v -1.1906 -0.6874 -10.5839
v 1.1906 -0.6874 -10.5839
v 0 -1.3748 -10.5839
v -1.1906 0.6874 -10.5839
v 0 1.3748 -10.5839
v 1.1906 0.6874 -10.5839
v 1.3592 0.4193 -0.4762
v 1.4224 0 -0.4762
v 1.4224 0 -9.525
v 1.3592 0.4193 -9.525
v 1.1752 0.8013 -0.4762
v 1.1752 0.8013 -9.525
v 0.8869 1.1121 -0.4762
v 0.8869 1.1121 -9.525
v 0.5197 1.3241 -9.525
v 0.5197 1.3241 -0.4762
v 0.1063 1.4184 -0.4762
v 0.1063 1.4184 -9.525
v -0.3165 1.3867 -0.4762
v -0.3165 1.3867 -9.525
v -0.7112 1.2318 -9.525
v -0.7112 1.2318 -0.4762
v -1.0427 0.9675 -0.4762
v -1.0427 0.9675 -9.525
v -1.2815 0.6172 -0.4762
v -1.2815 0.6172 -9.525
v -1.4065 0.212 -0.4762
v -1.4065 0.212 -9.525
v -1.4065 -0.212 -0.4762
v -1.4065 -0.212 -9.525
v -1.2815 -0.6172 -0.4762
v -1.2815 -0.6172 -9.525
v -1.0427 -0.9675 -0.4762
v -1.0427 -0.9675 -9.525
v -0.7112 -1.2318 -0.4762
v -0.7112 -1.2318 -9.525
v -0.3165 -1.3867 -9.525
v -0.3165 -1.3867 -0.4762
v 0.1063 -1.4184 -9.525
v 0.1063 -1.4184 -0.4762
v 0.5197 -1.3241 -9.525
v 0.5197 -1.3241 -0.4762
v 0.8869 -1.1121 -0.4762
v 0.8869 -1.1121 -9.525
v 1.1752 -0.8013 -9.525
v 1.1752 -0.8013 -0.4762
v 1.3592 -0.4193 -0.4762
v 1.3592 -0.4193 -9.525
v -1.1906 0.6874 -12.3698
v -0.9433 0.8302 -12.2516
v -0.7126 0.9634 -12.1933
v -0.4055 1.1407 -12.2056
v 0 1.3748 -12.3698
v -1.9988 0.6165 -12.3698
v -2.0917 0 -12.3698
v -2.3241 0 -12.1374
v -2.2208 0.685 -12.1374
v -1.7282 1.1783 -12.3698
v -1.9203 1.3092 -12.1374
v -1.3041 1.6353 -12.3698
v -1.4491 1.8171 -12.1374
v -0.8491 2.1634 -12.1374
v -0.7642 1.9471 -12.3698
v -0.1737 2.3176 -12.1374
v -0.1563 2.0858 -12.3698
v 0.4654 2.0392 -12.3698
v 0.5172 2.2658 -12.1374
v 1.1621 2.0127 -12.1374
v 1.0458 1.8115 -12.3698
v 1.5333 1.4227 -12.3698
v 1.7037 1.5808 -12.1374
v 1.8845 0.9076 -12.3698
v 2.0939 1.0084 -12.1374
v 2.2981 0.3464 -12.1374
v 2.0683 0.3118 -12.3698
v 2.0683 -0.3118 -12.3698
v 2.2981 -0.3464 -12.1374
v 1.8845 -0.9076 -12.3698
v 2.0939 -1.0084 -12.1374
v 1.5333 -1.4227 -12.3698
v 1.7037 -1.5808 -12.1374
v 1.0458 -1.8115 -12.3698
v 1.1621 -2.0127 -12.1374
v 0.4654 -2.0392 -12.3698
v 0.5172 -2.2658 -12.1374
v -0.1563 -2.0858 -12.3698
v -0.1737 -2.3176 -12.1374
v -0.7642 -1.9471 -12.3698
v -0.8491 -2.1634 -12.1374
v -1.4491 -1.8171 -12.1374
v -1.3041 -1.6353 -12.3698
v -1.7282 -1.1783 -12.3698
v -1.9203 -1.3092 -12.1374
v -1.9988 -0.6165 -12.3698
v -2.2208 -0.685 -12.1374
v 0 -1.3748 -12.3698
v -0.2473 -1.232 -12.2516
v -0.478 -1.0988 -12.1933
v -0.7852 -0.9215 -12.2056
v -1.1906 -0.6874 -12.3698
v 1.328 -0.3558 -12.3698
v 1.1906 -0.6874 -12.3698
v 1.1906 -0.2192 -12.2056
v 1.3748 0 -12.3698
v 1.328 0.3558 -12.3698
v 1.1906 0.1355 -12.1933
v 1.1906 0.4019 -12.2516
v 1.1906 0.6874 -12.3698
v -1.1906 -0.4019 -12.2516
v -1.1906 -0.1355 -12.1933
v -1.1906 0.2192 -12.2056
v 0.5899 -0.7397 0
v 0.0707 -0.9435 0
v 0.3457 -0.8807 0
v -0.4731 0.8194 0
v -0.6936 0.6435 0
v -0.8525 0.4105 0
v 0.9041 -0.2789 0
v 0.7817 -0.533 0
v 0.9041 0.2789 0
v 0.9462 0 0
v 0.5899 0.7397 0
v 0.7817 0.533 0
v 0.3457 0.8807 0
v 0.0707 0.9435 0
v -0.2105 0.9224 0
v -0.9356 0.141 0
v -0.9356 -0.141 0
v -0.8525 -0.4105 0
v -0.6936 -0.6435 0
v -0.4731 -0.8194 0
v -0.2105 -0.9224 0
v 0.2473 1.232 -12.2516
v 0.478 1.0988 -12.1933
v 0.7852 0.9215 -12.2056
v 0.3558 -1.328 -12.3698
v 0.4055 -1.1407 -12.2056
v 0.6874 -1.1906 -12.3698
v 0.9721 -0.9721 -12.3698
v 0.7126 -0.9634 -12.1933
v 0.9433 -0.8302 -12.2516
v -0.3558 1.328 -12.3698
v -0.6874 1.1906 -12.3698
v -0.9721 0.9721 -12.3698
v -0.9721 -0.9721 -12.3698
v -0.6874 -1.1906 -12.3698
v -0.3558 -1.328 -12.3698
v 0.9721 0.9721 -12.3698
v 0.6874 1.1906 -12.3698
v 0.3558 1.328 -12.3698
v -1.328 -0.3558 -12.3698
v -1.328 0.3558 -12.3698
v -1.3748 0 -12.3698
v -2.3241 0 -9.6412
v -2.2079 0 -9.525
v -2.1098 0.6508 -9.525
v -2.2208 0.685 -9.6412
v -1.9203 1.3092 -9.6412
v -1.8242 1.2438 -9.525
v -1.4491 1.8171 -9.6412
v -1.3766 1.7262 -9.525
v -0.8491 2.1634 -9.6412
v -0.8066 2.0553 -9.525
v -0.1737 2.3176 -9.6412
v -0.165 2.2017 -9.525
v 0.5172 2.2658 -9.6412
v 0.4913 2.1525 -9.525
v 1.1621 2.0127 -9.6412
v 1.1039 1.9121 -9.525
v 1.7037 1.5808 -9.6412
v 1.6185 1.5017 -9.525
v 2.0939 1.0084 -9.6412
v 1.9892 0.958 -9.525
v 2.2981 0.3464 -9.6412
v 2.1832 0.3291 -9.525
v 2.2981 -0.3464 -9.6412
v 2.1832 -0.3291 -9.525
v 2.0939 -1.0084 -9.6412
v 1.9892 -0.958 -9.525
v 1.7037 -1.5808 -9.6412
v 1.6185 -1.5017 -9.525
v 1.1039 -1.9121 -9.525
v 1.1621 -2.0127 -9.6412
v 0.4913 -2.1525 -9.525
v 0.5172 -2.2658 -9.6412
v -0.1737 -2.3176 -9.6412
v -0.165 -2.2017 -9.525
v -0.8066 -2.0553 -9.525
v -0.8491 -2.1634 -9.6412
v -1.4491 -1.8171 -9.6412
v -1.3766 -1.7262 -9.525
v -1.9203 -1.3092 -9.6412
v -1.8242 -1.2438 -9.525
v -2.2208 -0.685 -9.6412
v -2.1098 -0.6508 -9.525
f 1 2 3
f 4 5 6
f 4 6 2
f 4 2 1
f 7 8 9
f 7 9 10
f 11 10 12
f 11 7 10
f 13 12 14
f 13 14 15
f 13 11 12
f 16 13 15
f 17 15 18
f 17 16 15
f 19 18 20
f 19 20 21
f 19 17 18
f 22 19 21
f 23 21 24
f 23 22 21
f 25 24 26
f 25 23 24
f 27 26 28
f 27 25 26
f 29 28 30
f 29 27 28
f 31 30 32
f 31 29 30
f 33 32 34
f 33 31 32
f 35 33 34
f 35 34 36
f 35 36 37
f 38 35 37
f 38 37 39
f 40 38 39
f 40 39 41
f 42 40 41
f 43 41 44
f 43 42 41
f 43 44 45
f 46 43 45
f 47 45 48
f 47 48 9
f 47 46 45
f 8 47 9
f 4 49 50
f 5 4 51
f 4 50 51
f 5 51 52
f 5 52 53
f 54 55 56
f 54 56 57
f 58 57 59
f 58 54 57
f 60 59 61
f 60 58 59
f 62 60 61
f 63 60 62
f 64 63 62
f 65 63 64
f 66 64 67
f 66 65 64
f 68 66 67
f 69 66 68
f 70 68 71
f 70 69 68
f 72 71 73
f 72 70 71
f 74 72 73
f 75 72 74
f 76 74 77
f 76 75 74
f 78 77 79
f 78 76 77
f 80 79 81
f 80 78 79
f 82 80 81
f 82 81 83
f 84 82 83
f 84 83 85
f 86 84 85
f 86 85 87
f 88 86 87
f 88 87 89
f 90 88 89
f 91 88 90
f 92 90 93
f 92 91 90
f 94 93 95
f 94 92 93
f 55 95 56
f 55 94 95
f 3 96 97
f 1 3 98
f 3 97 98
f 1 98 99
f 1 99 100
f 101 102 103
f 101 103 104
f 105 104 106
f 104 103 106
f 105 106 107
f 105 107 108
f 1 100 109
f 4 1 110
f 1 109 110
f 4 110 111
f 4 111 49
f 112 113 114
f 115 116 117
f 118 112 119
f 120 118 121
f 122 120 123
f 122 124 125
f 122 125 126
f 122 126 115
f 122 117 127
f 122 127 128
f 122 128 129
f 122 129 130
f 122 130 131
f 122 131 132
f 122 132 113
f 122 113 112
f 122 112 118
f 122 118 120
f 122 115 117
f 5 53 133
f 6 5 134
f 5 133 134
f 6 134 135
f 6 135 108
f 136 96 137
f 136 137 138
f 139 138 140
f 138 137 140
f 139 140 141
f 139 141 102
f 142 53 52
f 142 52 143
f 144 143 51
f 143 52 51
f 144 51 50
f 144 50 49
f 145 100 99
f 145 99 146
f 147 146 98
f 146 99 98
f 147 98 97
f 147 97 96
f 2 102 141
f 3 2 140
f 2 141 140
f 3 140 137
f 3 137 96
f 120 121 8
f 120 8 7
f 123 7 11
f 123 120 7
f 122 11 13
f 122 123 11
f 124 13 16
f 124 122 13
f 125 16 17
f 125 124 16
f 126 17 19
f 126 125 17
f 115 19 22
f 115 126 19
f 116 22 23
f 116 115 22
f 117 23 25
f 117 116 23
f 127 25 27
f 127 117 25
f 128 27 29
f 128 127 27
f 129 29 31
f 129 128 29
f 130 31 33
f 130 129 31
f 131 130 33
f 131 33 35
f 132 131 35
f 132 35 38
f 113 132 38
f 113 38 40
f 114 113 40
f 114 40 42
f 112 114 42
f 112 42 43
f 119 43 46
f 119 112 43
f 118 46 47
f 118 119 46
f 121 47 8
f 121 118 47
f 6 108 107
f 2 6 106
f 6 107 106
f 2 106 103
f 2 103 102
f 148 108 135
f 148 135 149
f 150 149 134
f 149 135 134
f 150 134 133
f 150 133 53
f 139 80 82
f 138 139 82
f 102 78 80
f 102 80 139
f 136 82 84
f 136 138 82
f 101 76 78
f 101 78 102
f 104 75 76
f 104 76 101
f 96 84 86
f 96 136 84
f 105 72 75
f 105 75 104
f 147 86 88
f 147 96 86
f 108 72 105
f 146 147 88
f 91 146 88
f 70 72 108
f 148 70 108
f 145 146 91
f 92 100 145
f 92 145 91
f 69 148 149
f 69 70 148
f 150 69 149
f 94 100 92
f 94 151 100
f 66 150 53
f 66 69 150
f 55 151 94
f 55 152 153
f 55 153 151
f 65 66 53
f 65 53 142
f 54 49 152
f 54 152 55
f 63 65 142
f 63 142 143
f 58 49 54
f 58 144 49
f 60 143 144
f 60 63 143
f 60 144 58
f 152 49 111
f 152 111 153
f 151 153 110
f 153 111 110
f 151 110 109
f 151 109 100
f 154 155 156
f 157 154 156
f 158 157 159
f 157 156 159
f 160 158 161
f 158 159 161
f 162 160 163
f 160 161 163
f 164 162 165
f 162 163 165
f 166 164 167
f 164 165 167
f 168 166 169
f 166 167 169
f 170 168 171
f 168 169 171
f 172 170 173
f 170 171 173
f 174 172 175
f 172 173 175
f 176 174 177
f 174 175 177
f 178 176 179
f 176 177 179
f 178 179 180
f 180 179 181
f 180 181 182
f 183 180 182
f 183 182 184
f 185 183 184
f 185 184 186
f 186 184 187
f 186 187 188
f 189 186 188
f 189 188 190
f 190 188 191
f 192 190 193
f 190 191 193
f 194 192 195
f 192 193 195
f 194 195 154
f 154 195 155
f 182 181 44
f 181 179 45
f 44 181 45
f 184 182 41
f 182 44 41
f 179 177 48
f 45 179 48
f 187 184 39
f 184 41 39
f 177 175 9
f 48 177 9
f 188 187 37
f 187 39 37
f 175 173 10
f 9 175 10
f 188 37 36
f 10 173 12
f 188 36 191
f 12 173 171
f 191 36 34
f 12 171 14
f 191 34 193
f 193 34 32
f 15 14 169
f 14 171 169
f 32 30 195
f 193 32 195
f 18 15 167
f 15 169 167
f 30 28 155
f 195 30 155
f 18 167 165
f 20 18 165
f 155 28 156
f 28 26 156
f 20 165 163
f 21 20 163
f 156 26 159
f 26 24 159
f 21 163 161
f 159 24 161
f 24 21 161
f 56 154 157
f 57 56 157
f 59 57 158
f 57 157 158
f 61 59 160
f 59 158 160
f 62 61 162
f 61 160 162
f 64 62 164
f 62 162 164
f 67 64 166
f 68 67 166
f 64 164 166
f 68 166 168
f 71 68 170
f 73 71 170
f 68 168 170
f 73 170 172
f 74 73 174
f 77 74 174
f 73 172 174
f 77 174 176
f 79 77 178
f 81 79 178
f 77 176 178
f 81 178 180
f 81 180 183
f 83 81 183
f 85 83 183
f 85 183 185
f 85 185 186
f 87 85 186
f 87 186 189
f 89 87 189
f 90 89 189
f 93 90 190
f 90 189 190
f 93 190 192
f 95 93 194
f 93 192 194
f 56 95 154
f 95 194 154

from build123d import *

# Parameters (mm, degrees)
SKETCH1_R          = 1.4224
EXTRUDE1_DEPTH     = 9.525
CHAMFER3_SIZE      = 0.47625
SKETCH6_R          = 2.3241
EXTRUDE2_DEPTH     = 2.8448
CUT_EXTRUDE1_DEPTH = 1.7859375
CHAMFER1_SIZE      = 0.23241
CHAMFER2_SIZE      = 0.116205


with BuildPart() as part:
    # Sketch1 → Extrude1 (new body)
    with BuildSketch(Plane.XY):
        Circle(SKETCH1_R)
    extrude(amount=-EXTRUDE1_DEPTH)

    # Chamfer3
    chamfer3_edges = [part.edges().sort_by_distance(p)[0] for p in [
        (-1.4224, 0, 0),
    ]]
    chamfer(chamfer3_edges, length=CHAMFER3_SIZE)

    # Sketch6 → Extrude2 (add)
    with BuildSketch(Plane(origin=(0, 0, -9.525), x_dir=(-1, 0, 0), z_dir=(0, 0, -1))):
        Circle(SKETCH6_R)
    extrude(amount=EXTRUDE2_DEPTH)

    # Sketch7 → Cut-Extrude1 (cut)
    with BuildSketch(Plane(origin=(0, 0, -12.3698), x_dir=(-1, 0, 0), z_dir=(0, 0, -1))):
        Polygon((0, 1.374815329), (-1.190625, 0.687407664), (-1.190625, -0.687407664), (0, -1.374815329), (1.190625, -0.687407664), (1.190625, 0.687407664), align=None)
    extrude(amount=-CUT_EXTRUDE1_DEPTH, mode=Mode.SUBTRACT)

    # Cut-Extrude2 cone 1 section (through the dimple's axis) → Cut-Extrude2 (revolve, cut)
    with BuildSketch(Plane(origin=(0, 0, -12.3698), x_dir=(0, 1, 0), z_dir=(1, 0, 0))):
        Polygon((0, 0), (1.374815329, 0), (0, 1.374815329), align=None)
    revolve(axis=Axis((0, 0, -12.3698), (0, 0, 1)), mode=Mode.SUBTRACT)

    # Chamfer1
    chamfer1_edges = [part.edges().sort_by_distance(p)[0] for p in [
        (2.3241, 0, -12.3698),
    ]]
    chamfer(chamfer1_edges, length=CHAMFER1_SIZE)

    # Chamfer2
    chamfer2_edges = [part.edges().sort_by_distance(p)[0] for p in [
        (2.3241, 0, -9.525),
    ]]
    chamfer(chamfer2_edges, length=CHAMFER2_SIZE)


solid = part.part
